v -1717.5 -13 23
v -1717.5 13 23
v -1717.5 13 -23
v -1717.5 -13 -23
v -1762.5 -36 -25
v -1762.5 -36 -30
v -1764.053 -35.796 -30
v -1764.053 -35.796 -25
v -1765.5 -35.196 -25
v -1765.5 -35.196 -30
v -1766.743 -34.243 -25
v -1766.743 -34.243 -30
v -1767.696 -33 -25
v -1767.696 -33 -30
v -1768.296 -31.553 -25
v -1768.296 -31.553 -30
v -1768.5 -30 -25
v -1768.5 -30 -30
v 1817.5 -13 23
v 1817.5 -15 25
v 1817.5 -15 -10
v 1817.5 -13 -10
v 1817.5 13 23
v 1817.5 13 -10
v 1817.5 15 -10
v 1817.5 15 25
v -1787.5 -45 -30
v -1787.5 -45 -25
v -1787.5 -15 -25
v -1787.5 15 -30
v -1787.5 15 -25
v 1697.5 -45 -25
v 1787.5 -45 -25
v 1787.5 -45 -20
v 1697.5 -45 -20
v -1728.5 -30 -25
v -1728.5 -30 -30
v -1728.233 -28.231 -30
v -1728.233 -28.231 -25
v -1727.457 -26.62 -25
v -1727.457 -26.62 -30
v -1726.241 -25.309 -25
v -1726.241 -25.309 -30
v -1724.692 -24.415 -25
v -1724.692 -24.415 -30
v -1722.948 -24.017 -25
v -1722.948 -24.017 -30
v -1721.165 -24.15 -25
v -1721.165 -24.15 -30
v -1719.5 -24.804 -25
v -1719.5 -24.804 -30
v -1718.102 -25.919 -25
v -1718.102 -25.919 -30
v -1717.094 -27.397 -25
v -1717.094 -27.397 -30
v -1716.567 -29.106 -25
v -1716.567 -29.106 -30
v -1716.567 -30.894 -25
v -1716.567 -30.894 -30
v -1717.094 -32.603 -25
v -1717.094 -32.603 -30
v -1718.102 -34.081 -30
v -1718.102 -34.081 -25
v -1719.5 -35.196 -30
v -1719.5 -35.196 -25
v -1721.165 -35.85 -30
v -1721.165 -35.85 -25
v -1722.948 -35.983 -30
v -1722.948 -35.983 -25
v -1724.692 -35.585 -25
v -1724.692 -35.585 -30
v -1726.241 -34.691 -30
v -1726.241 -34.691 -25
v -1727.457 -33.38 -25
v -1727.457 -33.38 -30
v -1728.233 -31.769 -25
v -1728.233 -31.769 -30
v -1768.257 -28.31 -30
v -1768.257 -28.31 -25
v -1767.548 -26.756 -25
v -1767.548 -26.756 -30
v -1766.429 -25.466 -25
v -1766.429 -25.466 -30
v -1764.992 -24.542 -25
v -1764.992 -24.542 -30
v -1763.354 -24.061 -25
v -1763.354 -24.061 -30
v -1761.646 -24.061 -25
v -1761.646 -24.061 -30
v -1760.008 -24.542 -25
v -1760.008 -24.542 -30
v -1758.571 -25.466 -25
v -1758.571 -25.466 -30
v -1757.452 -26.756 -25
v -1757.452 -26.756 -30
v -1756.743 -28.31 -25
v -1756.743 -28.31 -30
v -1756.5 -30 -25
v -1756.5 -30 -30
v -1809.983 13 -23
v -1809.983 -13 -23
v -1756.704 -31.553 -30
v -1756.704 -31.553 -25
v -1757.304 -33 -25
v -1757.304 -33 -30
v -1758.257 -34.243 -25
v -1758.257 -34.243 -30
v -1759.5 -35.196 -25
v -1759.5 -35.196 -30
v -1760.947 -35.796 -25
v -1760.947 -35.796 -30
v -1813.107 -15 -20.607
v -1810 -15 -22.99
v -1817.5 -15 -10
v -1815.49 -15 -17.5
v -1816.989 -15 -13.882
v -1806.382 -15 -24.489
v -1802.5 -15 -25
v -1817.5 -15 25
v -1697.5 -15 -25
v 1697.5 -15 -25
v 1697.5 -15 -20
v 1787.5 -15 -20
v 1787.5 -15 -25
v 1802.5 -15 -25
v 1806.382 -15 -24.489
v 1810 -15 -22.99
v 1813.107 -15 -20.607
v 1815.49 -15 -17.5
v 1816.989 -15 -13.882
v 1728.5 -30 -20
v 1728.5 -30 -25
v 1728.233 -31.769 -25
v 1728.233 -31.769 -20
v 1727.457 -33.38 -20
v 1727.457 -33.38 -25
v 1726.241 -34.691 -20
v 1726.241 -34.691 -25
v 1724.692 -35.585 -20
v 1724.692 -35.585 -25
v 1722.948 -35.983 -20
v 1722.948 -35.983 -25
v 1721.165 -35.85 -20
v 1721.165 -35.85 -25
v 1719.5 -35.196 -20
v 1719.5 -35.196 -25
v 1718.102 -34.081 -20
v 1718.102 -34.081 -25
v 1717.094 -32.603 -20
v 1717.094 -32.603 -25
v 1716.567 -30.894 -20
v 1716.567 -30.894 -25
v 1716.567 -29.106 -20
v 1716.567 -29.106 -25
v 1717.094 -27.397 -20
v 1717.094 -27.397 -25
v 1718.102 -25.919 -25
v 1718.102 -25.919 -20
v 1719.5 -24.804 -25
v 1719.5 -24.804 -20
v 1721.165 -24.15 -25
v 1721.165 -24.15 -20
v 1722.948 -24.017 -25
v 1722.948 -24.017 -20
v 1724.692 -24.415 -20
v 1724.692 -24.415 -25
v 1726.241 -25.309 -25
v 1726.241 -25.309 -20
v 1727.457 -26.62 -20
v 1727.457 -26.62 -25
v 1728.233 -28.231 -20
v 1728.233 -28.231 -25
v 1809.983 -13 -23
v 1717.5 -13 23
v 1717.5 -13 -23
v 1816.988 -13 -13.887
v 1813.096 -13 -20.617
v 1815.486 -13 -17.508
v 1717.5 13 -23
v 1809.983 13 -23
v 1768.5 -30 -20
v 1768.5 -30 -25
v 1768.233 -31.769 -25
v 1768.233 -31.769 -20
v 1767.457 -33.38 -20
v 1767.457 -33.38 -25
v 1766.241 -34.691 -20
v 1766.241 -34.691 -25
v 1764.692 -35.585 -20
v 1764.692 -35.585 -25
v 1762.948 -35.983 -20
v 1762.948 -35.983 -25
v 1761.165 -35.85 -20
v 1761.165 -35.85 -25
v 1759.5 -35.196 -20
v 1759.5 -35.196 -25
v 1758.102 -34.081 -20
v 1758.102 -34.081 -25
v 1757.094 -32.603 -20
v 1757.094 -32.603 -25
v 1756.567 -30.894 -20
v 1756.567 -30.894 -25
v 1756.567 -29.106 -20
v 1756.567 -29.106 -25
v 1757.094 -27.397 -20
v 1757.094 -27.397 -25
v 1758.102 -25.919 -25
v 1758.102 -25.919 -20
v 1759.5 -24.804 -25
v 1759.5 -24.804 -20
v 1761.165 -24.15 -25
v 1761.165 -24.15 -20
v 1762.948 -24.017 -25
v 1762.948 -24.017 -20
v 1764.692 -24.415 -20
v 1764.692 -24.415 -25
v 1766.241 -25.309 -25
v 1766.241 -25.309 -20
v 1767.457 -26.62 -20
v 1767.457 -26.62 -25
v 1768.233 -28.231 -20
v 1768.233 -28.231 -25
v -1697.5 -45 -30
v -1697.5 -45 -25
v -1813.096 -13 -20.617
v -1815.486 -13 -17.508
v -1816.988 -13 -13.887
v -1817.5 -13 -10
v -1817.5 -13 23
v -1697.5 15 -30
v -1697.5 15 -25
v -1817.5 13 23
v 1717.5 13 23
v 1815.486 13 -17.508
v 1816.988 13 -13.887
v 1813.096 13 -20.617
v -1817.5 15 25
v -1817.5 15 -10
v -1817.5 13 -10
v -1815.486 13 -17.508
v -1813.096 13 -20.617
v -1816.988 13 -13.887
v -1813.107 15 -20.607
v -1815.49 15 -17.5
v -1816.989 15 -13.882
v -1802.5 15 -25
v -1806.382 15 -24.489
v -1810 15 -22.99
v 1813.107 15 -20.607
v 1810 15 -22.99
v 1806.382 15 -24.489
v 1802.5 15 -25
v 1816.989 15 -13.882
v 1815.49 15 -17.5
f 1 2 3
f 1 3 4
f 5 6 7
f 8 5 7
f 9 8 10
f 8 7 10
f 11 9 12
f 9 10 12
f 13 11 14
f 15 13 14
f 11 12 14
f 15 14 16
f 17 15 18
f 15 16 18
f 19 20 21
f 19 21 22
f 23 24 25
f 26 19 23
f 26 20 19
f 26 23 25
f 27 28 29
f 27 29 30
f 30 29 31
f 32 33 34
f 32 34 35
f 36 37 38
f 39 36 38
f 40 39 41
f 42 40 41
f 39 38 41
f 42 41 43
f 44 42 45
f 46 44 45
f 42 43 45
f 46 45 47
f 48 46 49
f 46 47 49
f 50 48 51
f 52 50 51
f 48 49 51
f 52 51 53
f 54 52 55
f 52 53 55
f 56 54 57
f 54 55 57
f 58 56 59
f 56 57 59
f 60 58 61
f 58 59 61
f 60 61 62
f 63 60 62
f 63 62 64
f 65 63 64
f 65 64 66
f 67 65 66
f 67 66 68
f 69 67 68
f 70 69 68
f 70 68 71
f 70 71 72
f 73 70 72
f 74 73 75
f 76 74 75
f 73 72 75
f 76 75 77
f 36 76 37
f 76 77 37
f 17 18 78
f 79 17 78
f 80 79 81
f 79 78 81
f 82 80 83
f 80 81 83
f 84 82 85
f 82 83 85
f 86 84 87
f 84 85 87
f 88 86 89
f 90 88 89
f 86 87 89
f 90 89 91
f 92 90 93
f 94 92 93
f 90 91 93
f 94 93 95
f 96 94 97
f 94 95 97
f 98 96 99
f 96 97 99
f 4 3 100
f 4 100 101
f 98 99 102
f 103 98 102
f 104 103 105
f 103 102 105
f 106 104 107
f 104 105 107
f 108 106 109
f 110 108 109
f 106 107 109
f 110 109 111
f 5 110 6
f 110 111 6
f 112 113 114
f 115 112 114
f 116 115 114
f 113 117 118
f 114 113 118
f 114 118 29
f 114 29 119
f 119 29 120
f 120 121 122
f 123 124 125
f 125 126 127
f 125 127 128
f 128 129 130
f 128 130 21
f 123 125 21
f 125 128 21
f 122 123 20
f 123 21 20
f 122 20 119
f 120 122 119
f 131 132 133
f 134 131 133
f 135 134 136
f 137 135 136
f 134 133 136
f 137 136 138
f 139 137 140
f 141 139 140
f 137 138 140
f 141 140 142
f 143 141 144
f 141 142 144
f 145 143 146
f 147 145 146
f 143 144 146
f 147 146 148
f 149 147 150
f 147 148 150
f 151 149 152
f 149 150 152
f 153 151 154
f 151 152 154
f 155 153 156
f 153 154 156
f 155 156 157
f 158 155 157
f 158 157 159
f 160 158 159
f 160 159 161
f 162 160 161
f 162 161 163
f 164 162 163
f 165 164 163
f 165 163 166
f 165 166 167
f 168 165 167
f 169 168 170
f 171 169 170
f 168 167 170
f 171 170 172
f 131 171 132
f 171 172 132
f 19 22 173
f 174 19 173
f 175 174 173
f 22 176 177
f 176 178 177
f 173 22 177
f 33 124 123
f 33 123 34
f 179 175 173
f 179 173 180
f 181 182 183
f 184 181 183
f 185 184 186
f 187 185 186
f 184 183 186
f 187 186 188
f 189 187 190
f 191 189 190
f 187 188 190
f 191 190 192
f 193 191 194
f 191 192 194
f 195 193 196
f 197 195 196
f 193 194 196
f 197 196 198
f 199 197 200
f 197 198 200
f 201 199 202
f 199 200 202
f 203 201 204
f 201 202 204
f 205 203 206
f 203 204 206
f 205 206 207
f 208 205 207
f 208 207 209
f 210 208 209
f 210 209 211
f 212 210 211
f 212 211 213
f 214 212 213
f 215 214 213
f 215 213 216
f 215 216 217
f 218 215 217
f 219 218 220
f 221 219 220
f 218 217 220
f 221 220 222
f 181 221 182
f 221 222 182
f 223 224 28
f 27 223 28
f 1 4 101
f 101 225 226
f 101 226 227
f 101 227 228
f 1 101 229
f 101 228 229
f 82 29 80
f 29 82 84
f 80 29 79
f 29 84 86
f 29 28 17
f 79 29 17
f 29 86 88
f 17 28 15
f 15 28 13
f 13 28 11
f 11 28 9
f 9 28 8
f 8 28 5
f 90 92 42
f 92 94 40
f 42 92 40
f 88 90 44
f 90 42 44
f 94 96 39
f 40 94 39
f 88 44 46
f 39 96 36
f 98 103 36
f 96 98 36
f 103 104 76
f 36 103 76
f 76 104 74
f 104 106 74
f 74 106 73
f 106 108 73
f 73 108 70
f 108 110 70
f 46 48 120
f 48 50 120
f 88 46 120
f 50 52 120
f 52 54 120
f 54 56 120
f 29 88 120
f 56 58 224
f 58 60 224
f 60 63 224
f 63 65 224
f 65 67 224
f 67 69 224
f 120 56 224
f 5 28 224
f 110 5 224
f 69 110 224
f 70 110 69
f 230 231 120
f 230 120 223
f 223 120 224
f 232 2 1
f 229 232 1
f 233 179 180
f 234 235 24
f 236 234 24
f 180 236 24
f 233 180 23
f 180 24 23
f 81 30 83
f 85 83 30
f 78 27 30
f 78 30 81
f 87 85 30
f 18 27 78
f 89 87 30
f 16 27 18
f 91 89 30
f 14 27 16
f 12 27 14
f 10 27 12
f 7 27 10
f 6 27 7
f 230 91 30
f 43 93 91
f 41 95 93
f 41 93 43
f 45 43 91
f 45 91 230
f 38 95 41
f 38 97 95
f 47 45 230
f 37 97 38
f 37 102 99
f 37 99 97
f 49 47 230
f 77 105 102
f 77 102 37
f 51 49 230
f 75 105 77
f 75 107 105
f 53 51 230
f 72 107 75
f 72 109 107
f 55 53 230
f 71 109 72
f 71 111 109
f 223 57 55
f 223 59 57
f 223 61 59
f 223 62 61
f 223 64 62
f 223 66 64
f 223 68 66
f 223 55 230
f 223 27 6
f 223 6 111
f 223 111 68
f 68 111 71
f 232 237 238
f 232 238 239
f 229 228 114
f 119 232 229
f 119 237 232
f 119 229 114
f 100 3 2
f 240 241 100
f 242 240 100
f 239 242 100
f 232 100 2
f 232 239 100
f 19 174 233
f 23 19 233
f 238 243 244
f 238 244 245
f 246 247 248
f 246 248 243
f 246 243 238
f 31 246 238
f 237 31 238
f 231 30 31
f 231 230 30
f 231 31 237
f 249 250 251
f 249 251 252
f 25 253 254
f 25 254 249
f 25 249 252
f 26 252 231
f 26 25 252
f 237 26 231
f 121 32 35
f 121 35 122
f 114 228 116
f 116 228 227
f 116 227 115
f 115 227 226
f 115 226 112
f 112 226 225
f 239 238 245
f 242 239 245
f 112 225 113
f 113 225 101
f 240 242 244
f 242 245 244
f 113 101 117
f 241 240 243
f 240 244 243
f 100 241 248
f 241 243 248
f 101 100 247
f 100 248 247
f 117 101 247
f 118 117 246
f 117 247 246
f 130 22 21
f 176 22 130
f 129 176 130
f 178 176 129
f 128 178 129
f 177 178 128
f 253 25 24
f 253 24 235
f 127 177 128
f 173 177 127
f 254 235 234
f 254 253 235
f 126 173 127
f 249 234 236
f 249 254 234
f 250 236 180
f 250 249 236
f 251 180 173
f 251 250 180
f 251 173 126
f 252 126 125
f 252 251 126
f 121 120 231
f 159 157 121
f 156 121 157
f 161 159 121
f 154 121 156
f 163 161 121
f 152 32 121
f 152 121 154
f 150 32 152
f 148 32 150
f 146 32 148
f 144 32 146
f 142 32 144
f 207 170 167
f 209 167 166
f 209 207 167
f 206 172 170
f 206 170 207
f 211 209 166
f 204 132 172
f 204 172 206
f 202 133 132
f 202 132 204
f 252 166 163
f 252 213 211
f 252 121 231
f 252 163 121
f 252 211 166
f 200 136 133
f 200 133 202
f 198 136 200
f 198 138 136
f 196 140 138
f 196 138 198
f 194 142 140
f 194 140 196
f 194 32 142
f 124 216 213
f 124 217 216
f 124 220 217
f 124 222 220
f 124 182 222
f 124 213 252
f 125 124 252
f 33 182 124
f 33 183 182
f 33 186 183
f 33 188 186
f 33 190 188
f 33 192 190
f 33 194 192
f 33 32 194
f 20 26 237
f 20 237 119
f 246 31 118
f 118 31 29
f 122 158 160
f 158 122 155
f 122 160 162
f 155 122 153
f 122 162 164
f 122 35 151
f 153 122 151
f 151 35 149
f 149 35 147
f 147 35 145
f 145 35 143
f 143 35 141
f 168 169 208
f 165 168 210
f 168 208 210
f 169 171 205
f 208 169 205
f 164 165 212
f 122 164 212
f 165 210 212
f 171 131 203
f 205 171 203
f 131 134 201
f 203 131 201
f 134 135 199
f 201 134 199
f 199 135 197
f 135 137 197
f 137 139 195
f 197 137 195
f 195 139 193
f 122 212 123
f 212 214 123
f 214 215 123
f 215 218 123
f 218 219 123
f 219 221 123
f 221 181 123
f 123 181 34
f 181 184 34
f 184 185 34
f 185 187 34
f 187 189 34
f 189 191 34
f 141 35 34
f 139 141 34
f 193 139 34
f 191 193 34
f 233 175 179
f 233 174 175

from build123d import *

# Parameters (mm, degrees)
F0_W          = 3575
F0_H          = 50
F1_DEPTH      = 15
F1_DEPTH_BACK = 15
F3_DEPTH      = 5
F5_DEPTH      = 5
F6_R          = 6
F7_DEPTH      = 5
F8_R          = 6
F9_DEPTH      = 5
F12_DEPTH     = 5
F13_W         = 30
F13_H         = 50
F14_DEPTH     = 30
F15_R         = 15
F16_W         = 26
F16_H         = 13
F16_H_2       = 33
F17_DEPTH     = 100
F18_W         = 30
F18_H         = 50
F19_DEPTH     = 30
F20_W         = 26
F20_H         = 46
F21_DEPTH     = 100
F22_T1_DEPTH  = 105
F23_DEPTH     = 5
F24_DEPTH     = 5


# Not quite as in the source:
# - a fillet or chamfer that OpenCascade refuses, or shapes differently, is made with other operations: its cross-section is extruded or revolved along the edge and cut away or added


with BuildPart() as f1:
    # F0 (on Front) → F1 (new body, two sides)
    with BuildSketch(Plane.XZ) as f1_sk:
        Rectangle(F0_W, F0_H)
    extrude(amount=F1_DEPTH)
    extrude(f1_sk.sketch, amount=-F1_DEPTH_BACK)

    # F2 (on face) → F3 (join)
    with BuildSketch(Plane(origin=(0, 0, -25), x_dir=(1, 0, 0), z_dir=(0, 0, -1))):
        Polygon((-1787.5, 45), (-1787.5, 15), (-1787.5, -15), (-1697.5, -15), (-1697.5, 45), align=None)
    extrude(amount=F3_DEPTH)

    # F4 (on face) → F5 (join)
    with BuildSketch(Plane(origin=(0, 0, -25), x_dir=(1, 0, 0), z_dir=(0, 0, -1))):
        Polygon((1787.5, -15), (1787.5, 15), (1787.5, 45), (1697.5, 45), (1697.5, -15), align=None)
    extrude(amount=F5_DEPTH)

    # F6 (on face) → F7 (cut, through all)
    with BuildSketch(Plane(origin=(0, 0, -30), x_dir=(1, 0, 0), z_dir=(0, 0, -1))):
        with Locations((-935, 30)):
            Circle(F6_R)
        with Locations((-975, 30)):
            Circle(F6_R)
    extrude(amount=-F7_DEPTH, mode=Mode.SUBTRACT)

    # F8 (on face) → F9 (cut, through all)
    with BuildSketch(Plane(origin=(0, 0, -30), x_dir=(1, 0, 0), z_dir=(0, 0, -1))):
        with Locations((1762.5, 30)):
            Circle(F8_R)
        with Locations((1722.5, 30)):
            Circle(F8_R)
    extrude(amount=-F9_DEPTH, mode=Mode.SUBTRACT)

    # F11 (on face) → F12 (cut, through all)
    with BuildSketch(Plane(origin=(0, 0, -30), x_dir=(1, 0, 0), z_dir=(0, 0, -1))):
        with BuildLine():
            ThreePointArc((-1762.5, 36), (-1766.7426406871, 34.2426406871), (-1768.5, 30))
            Line((-1768.5, 30), (-1762.5, 30))
            Line((-1762.5, 30), (-1762.5, 36))
        make_face()
        with BuildLine():
            ThreePointArc((-1716.5, 30), (-1722.5, 36), (-1728.5, 30))
            ThreePointArc((-1728.5, 30), (-1722.5, 24), (-1716.5, 30))
        make_face()
        with BuildLine():
            Line((-1762.5, 30), (-1768.5, 30))
            ThreePointArc((-1768.5, 30), (-1762.5, 24), (-1756.5, 30))
            Line((-1756.5, 30), (-1762.5, 30))
        make_face()
        with BuildLine():
            Line((-1762.5, 36), (-1762.5, 30))
            Line((-1762.5, 30), (-1756.5, 30))
            ThreePointArc((-1756.5, 30), (-1758.2573593129, 34.2426406871), (-1762.5, 36))
        make_face()
    extrude(amount=-F12_DEPTH, mode=Mode.SUBTRACT)

    # F13 (on face) → F14 (join)
    with BuildSketch(Plane.YZ.offset(1787.5)):
        Rectangle(F13_W, F13_H)
    extrude(amount=F14_DEPTH)

    # F15
    f15_edges = [f1.edges().sort_by_distance(p)[0] for p in [
        (1817.5, 0, -25),
    ]]
    fillet(f15_edges, radius=F15_R)

    # F16 (on face) → F17 (cut)
    with BuildSketch(Plane.YZ.offset(1817.5)):
        with Locations((0, -16.5)):
            Rectangle(F16_W, F16_H)
        with Locations((0, 6.5)):
            Rectangle(F16_W, F16_H_2)
    extrude(amount=-F17_DEPTH, mode=Mode.SUBTRACT)

    # F18 (on face) → F19 (join)
    with BuildSketch(Plane(origin=(-1787.5, 0, 0), x_dir=(0, -1, 0), z_dir=(-1, 0, 0))):
        Rectangle(F18_W, F18_H)
    extrude(amount=F19_DEPTH)

    # F20 (on face) → F21 (cut)
    with BuildSketch(Plane(origin=(-1817.5, 0, 0), x_dir=(0, -1, 0), z_dir=(-1, 0, 0))):
        Rectangle(F20_W, F20_H)
    extrude(amount=-F21_DEPTH, mode=Mode.SUBTRACT)

    # F22: fillet of radius 15 on 1 edges, made by hand

    # F22_s2 → F22_t1 (cut)
    with BuildSketch(Plane.XZ.offset(-52.5)):
        with BuildLine():
            ThreePointArc((-1817.5, -10), (-1813.1066017178, -20.6066017178), (-1802.5, -25))
            Line((-1802.5, -25), (-1817.5, -25))
            Line((-1817.5, -25), (-1817.5, -10))
        make_face()
    extrude(amount=F22_T1_DEPTH, mode=Mode.SUBTRACT)

    # F23 (add): a face of the model
    f23_faces = [f1.faces().sort_by_distance(p)[0] for p in [
        (1742.5, -30, -25),
    ]]
    extrude(f23_faces, amount=F23_DEPTH)

    # F24 (cut): a face of the model
    f24_faces = [f1.faces().sort_by_distance(p)[0] for p in [
        (1742.5, -14.3442118808, -30),
    ]]
    extrude(f24_faces, amount=-F24_DEPTH, mode=Mode.SUBTRACT)


solid = f1.part
